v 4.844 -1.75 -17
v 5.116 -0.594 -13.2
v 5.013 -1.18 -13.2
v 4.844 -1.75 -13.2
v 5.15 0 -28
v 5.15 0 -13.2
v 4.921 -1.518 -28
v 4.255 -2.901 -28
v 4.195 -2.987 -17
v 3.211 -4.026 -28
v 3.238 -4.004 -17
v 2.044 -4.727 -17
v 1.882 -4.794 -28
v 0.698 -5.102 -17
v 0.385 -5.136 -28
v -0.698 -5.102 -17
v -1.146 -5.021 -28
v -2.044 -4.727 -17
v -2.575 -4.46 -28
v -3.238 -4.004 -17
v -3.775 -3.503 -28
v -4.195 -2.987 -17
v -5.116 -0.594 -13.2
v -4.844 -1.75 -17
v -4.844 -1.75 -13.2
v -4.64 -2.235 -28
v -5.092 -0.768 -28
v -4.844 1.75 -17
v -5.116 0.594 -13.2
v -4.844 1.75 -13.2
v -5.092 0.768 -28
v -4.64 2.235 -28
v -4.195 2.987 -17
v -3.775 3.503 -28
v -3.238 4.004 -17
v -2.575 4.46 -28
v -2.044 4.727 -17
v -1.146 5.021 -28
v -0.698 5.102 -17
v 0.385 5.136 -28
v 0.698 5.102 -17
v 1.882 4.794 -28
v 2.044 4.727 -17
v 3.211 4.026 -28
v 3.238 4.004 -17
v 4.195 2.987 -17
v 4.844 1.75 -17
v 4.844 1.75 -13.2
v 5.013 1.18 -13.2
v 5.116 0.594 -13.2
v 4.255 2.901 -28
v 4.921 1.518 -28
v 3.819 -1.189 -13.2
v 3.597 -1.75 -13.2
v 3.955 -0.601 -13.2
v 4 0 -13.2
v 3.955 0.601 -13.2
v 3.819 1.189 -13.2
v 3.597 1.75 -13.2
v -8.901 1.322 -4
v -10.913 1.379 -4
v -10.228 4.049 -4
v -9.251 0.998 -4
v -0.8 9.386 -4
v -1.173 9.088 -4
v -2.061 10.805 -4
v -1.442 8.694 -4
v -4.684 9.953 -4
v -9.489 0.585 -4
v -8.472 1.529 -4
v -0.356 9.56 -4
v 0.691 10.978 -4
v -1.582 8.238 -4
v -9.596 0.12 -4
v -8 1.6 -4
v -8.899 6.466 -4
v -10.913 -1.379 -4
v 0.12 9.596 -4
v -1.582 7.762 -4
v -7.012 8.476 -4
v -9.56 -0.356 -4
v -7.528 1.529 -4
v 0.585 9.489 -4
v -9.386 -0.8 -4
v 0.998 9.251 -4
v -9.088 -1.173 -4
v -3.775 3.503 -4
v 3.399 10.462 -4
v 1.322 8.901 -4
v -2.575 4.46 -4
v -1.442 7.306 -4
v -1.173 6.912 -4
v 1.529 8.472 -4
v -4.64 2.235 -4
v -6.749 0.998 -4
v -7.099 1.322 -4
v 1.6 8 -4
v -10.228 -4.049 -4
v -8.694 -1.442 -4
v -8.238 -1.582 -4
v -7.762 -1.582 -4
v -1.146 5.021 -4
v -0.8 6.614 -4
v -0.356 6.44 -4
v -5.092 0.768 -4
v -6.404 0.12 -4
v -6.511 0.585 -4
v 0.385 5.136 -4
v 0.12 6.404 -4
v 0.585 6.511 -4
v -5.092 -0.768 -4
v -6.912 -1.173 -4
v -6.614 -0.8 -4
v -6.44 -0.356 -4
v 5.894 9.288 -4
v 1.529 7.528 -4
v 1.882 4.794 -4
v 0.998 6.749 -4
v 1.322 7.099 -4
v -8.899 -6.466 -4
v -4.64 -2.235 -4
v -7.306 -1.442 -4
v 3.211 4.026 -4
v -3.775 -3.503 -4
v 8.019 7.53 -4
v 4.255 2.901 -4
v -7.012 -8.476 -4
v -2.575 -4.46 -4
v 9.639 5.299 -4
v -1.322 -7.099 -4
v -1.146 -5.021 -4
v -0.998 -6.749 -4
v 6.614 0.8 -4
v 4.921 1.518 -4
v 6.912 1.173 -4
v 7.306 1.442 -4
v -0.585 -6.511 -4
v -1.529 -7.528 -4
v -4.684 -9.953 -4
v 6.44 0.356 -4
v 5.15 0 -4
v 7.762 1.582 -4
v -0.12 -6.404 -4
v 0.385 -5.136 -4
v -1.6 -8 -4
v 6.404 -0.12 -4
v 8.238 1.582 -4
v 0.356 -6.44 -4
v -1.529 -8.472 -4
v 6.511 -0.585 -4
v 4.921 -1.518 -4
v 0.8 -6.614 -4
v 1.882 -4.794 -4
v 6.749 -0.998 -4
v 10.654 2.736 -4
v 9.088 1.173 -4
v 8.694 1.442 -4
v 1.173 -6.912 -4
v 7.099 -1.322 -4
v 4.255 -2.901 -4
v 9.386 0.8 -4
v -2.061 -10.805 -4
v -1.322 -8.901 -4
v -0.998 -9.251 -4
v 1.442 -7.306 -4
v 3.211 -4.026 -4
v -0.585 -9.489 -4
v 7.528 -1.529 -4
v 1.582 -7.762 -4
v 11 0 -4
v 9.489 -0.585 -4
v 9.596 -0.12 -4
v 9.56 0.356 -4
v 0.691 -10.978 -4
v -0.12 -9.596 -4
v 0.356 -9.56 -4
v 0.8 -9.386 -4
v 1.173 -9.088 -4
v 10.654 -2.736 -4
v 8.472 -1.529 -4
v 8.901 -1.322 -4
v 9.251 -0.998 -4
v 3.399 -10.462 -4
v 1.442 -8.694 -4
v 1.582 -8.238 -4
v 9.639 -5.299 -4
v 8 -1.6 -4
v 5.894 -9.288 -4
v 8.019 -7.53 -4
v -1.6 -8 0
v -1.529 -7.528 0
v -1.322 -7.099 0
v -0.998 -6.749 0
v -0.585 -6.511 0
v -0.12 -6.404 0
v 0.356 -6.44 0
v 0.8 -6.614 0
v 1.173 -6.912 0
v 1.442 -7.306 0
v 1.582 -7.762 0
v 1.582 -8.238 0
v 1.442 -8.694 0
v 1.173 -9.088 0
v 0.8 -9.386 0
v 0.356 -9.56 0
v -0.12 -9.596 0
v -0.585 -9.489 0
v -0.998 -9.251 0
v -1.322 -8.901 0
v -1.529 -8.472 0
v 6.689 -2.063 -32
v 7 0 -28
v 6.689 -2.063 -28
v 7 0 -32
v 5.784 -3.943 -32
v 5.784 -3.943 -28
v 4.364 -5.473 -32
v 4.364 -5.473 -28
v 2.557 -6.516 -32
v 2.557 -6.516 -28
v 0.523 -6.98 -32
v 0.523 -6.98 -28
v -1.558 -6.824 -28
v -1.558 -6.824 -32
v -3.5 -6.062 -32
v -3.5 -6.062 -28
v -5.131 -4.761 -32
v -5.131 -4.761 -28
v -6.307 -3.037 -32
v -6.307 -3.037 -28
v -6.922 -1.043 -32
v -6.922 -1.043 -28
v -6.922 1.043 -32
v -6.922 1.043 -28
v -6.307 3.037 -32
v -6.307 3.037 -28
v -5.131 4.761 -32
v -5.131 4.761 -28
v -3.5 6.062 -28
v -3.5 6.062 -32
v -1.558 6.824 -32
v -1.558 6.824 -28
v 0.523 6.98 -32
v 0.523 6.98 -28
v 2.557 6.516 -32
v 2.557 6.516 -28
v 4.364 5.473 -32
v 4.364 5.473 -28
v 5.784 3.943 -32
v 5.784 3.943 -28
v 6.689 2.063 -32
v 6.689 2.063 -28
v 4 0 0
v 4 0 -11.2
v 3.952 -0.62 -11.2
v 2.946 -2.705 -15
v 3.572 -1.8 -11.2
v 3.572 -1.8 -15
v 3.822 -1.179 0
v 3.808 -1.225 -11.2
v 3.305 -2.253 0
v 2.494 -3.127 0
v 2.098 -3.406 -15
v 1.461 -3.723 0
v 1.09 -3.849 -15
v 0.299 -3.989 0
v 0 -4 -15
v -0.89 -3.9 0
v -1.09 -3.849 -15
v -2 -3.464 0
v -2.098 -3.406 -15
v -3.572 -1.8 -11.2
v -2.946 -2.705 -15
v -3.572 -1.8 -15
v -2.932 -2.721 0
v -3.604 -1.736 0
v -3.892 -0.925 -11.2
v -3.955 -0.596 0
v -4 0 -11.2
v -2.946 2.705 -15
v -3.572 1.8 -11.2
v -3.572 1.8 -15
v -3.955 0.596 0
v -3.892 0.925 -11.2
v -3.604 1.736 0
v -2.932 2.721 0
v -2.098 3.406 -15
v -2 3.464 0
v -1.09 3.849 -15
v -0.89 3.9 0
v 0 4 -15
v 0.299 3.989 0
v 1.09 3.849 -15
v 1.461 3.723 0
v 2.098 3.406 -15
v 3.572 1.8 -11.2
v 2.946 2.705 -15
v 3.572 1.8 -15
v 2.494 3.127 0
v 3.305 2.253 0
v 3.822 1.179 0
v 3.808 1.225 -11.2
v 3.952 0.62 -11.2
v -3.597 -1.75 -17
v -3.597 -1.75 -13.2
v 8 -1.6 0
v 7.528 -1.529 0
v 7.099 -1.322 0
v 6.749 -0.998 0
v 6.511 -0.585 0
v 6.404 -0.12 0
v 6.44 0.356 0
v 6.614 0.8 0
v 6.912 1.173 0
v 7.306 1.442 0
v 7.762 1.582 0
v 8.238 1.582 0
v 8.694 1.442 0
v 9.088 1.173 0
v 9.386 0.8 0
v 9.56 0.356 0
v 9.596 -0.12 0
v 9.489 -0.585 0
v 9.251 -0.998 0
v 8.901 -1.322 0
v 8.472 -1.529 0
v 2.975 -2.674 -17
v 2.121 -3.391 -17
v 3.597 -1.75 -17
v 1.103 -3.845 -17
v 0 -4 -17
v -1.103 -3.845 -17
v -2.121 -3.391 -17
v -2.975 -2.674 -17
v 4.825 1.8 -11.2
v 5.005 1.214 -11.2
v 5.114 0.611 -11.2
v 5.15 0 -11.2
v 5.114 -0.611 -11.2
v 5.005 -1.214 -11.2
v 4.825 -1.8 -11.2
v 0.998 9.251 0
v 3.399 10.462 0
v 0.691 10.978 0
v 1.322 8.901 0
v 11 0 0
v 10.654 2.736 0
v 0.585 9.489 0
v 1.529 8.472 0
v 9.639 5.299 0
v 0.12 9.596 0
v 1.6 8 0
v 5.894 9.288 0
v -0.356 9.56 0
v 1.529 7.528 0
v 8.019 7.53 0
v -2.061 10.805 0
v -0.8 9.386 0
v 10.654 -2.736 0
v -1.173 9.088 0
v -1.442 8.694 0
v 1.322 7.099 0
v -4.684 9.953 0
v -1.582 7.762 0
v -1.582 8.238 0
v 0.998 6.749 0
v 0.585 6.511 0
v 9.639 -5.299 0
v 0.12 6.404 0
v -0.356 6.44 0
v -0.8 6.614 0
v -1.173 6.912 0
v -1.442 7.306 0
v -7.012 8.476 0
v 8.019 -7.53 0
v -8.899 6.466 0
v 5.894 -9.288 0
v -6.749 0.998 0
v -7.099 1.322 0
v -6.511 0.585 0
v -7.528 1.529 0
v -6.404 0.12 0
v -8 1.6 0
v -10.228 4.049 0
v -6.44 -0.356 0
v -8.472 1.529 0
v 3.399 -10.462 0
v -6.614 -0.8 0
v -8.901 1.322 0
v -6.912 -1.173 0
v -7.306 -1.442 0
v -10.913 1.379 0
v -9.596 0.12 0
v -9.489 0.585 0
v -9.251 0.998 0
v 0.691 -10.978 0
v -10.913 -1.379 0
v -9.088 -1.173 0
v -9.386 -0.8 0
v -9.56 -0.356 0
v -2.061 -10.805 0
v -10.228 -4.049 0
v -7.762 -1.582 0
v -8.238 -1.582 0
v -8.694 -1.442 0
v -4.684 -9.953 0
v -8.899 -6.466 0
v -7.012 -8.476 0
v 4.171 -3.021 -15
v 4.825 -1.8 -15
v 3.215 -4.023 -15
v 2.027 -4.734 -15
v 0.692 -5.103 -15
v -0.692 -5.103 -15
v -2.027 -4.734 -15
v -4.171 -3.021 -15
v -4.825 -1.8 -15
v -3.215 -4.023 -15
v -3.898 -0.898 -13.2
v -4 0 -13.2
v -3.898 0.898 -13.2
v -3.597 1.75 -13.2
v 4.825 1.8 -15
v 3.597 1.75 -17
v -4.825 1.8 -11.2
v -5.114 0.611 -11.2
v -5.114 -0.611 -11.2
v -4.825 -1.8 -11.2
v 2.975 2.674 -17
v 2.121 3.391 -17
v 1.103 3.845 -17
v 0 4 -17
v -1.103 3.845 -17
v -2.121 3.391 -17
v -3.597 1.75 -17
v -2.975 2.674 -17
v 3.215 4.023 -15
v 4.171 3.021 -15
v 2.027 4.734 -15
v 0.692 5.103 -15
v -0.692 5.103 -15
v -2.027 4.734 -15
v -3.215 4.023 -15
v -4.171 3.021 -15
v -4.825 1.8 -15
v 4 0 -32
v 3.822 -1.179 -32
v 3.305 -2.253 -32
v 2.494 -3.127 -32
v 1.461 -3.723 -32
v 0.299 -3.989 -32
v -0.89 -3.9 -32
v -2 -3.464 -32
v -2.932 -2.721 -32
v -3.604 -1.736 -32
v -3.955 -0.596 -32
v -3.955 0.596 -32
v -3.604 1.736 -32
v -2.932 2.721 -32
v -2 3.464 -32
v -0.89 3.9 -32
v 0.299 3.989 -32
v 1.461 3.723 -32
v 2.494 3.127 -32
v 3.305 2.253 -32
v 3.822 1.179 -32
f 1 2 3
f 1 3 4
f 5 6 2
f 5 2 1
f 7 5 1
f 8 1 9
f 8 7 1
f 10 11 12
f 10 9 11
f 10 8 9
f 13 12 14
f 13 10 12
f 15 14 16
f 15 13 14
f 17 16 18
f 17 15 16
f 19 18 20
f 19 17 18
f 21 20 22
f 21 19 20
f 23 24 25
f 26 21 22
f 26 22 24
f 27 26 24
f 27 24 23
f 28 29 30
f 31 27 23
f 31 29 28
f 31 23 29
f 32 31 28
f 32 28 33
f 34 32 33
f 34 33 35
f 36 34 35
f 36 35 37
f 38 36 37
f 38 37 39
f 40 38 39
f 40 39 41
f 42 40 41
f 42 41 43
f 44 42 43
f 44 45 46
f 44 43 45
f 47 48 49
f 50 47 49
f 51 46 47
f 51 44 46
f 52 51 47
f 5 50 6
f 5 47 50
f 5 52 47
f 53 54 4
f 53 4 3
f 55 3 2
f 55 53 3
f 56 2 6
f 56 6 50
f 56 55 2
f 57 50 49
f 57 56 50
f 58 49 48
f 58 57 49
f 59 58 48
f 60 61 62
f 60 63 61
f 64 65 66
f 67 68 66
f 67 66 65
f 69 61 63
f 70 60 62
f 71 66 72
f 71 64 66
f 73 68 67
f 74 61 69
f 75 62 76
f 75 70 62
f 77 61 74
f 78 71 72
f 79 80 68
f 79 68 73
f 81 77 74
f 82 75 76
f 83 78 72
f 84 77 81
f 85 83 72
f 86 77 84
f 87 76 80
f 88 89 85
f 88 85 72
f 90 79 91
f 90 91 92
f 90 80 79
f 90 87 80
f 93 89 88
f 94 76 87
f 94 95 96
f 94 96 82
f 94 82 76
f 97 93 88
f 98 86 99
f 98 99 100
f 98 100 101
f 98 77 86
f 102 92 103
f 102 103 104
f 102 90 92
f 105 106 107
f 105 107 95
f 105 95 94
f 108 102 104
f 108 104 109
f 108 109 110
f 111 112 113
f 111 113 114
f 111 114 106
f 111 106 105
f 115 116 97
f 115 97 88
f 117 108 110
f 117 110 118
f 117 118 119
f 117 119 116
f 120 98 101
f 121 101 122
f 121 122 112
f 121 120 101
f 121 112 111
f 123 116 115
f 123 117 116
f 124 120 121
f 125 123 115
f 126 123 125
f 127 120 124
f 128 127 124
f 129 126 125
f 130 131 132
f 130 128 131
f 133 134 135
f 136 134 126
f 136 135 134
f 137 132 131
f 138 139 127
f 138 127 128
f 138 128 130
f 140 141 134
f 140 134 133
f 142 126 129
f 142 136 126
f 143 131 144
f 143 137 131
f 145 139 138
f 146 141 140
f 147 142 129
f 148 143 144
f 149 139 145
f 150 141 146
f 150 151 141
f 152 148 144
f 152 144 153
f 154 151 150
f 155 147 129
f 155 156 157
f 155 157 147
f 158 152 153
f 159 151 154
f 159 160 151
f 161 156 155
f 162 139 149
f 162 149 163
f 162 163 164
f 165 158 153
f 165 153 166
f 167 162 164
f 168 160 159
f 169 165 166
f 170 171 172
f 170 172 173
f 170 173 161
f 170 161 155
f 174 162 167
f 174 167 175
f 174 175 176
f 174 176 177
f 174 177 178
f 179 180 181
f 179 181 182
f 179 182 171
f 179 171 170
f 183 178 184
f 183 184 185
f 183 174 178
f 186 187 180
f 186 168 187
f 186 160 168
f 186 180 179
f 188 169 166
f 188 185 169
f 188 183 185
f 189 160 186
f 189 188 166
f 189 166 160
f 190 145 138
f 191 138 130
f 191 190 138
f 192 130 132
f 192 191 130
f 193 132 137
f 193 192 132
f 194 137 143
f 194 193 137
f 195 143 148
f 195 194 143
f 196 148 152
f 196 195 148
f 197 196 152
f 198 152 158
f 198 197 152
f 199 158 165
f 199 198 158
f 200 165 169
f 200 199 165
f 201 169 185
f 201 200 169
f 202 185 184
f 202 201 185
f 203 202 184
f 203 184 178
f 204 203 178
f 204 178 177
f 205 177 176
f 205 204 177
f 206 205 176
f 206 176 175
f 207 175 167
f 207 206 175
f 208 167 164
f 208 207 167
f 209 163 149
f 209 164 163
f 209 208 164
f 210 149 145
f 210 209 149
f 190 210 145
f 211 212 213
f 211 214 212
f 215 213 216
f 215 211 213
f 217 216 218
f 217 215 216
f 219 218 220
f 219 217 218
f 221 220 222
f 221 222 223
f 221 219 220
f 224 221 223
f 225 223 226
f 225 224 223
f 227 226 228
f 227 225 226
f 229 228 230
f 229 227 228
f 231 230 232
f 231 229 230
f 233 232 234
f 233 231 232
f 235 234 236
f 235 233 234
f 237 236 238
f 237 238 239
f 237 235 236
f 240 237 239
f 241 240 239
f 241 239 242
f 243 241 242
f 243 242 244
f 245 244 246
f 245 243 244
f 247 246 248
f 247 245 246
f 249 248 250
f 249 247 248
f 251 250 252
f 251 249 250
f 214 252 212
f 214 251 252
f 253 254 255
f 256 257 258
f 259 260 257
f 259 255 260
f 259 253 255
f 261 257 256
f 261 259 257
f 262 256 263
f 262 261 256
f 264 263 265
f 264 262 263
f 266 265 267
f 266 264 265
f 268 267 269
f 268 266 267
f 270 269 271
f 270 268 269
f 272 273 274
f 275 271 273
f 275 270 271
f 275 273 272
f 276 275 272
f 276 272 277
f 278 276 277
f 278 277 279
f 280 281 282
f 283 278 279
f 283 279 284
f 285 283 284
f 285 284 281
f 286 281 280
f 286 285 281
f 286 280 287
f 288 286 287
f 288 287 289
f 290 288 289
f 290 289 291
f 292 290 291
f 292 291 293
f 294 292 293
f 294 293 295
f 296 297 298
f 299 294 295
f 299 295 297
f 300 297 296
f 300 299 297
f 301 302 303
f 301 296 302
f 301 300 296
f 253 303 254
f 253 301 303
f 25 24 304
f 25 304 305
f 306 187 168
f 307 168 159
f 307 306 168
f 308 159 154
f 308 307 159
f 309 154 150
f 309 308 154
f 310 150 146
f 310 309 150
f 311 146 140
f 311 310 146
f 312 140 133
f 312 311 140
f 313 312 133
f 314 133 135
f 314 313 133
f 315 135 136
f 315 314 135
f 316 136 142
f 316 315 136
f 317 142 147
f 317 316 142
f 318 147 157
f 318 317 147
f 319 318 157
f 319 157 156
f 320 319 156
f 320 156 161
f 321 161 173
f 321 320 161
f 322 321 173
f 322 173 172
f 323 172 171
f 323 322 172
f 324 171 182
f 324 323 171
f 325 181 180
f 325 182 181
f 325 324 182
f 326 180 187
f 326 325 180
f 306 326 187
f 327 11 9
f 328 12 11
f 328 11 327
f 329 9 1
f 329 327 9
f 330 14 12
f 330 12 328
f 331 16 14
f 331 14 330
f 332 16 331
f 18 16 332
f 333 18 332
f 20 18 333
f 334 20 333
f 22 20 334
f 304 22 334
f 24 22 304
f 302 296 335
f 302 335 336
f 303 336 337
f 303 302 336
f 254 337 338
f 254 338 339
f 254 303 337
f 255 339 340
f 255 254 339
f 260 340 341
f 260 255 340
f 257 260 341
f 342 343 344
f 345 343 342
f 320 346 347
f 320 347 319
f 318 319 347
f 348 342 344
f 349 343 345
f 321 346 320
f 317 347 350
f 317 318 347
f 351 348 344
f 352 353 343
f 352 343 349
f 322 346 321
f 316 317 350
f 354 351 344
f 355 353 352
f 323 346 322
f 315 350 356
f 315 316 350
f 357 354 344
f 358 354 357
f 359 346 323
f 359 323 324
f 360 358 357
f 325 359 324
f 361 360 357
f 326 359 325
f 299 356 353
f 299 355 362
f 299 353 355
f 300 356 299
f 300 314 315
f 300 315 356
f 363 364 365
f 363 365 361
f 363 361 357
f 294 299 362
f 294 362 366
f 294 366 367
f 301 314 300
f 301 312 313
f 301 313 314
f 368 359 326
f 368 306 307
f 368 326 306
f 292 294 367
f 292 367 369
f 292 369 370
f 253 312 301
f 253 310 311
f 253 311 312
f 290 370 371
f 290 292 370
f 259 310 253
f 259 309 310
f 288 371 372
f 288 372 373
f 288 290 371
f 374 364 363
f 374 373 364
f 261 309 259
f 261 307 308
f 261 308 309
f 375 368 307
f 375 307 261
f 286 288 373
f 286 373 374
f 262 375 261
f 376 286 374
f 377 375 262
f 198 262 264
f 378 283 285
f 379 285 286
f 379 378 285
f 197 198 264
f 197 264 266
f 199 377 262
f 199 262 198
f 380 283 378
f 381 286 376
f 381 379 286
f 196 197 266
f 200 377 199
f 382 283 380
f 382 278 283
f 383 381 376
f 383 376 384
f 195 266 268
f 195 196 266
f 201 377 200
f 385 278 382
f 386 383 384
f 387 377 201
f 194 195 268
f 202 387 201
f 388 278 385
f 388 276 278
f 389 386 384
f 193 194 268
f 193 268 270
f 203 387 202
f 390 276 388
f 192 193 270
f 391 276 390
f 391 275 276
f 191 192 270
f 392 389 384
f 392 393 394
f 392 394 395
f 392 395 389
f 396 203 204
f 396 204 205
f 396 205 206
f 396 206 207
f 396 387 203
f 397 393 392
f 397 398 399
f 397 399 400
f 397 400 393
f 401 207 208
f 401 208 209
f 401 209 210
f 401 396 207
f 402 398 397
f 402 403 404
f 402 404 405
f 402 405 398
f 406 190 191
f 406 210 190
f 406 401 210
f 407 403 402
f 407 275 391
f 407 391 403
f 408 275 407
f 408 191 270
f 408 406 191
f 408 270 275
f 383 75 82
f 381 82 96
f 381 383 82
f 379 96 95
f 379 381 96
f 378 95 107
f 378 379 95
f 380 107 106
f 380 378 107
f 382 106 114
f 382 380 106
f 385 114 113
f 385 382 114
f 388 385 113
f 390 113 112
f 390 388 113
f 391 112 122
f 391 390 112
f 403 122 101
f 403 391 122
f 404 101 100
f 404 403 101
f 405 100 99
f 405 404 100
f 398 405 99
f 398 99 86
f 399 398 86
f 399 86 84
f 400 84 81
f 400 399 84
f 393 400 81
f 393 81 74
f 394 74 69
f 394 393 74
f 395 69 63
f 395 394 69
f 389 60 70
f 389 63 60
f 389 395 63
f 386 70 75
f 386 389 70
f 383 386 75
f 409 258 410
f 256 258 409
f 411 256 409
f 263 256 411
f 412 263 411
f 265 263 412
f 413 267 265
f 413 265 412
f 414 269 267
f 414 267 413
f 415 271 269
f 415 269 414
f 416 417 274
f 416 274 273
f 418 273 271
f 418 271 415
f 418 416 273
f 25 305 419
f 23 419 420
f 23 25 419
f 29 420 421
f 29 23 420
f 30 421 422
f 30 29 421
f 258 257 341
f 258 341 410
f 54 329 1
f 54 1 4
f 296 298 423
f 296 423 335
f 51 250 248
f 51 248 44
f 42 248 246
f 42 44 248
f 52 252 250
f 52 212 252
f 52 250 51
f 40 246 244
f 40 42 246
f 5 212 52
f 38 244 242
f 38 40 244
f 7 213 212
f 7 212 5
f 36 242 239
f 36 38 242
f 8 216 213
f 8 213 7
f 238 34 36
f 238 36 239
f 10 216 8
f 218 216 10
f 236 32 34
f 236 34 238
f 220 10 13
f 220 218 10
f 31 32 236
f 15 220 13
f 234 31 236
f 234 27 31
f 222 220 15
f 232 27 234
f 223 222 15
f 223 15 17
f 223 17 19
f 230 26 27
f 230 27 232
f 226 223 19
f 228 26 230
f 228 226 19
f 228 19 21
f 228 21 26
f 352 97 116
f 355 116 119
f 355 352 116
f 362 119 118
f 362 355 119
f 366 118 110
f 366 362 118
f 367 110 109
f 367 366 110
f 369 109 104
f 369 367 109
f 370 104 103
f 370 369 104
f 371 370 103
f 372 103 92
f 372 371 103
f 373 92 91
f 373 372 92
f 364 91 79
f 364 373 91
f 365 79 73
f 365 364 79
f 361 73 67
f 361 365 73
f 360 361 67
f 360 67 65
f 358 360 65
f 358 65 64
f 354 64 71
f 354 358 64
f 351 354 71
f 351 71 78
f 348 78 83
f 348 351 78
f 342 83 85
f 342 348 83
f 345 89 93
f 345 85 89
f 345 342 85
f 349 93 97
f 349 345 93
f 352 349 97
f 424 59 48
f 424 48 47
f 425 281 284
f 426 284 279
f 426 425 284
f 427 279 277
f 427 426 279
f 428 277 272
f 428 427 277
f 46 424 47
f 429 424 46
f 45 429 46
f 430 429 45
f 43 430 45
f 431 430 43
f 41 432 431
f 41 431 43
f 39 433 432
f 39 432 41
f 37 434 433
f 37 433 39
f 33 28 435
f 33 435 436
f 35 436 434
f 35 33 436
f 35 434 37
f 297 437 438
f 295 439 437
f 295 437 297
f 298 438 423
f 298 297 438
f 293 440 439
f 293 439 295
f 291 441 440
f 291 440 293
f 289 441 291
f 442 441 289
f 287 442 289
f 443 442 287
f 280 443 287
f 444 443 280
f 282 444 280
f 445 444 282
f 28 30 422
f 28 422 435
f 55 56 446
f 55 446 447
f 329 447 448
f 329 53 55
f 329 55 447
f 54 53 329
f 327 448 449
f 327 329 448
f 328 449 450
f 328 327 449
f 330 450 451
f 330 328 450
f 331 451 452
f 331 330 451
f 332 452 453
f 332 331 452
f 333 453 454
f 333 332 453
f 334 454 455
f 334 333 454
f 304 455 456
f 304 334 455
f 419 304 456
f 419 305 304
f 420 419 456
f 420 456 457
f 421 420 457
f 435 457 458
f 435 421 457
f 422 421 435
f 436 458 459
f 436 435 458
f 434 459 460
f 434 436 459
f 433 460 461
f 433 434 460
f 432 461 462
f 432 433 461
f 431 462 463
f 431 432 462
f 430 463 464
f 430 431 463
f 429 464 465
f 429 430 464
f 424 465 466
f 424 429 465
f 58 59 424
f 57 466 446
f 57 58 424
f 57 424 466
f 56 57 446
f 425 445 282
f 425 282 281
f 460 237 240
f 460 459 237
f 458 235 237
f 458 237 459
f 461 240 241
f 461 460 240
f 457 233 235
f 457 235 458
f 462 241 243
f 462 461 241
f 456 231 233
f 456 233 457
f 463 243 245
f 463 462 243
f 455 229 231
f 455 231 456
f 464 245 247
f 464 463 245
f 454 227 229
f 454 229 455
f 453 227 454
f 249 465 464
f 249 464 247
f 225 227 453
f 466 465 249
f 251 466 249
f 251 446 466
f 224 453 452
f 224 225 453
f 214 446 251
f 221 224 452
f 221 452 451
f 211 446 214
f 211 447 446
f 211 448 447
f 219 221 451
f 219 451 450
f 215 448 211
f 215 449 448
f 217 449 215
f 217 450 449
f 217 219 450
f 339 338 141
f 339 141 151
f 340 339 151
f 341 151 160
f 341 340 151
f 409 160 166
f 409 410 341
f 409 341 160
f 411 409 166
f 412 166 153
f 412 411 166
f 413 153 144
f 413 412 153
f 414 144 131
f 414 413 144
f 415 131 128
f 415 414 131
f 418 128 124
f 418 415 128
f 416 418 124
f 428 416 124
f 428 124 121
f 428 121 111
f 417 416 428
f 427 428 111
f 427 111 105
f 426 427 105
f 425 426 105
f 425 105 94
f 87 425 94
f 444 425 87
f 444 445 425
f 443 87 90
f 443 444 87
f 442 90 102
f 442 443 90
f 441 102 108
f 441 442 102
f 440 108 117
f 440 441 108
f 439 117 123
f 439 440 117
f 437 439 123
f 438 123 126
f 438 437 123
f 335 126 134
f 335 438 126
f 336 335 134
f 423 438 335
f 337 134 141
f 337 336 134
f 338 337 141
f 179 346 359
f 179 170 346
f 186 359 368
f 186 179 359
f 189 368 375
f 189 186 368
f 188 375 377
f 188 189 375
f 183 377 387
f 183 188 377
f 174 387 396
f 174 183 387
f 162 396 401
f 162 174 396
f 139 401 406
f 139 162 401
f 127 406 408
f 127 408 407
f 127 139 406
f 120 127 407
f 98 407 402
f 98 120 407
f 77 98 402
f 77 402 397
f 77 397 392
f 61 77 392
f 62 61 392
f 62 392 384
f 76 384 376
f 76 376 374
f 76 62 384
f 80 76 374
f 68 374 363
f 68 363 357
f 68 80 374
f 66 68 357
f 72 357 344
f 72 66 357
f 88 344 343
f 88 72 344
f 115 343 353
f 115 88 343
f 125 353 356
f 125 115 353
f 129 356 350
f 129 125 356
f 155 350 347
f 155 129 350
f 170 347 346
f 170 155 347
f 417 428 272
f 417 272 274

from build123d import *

# Parameters (mm, degrees)
MATRIZC1_COUNT             = 4
CORTAR_EXTRUIR1_DEPTH      = 36.580893749
CORTAR_EXTRUIR1_DEPTH_BACK = 36.580893749


with BuildPart() as part:
    # Croquis1 → Revolución1 (revolve)
    with BuildSketch(Plane(origin=(0, 0, 0), x_dir=(0, 0, -1), z_dir=(1, 0, 0)), mode=Mode.PRIVATE) as revoluci_n1_sk:
        Polygon((0, 4), (0, 11), (4, 11), (4, 5.15), (28, 5.15), (28, 7), (32, 7), (32, 4), align=None)
    revolve(revoluci_n1_sk.sketch.rotate(Axis((0, 0, 0), (0, 0, -1)), 90), axis=Axis((0, 0, 0), (0, 0, -1)))

    # Croquis3 → Taladro de margen para M31 (revolve, cut)
    with BuildSketch(Plane(origin=(8, 0, 0), x_dir=(0, -1, 0), z_dir=(1, 0, 0))):
        Polygon((0, 0), (0, 8.6), (1.6, 7), (1.6, 0), align=None)
    taladro_de_margen_para_m31 = revolve(axis=Axis((8, 0, 6.35), (0, 0, -1)), mode=Mode.SUBTRACT)

    # MatrizC1: Taladro de margen para M31 ×4 about axis
    matrizc1_axis = Axis((0, 0, 0), (0, 0, 1))
    for i in range(1, MATRIZC1_COUNT):
        add(taladro_de_margen_para_m31.rotate(matrizc1_axis, i * 360 / MATRIZC1_COUNT), mode=Mode.SUBTRACT)

    # Croquis4 → Cortar-Extruir1 (cut, two sides: drawn at the far end of the back side and taken through both)
    with BuildSketch(Plane(origin=(0, 0, 0), x_dir=(0, 0, -1), z_dir=(1, 0, 0)).offset(-CORTAR_EXTRUIR1_DEPTH_BACK)):
        Polygon((11.2, -1.8), (15, -1.8), (15, -5.15), (17, -5.15), (17, -1.75), (13.2, -1.75), (13.2, 1.75), (17, 1.75), (17, 5.15), (15, 5.15), (15, 1.8), (11.2, 1.8), align=None)
    extrude(amount=CORTAR_EXTRUIR1_DEPTH + CORTAR_EXTRUIR1_DEPTH_BACK, mode=Mode.SUBTRACT)


with BuildPart() as cortar_extruir1_piece_1:
    # of the separate pieces the step leaves, piece 1, a body of its own (cortar_extruir1_pieces)
    add(part.part.solids().sort_by_distance((11, 0, 0))[0])


with BuildPart() as cortar_extruir1_piece_2:
    # of the separate pieces the step leaves, piece 2, a body of its own (cortar_extruir1_pieces)
    add(part.part.solids().sort_by_distance((4, 0, -32))[0])


solid = Compound([cortar_extruir1_piece_1.part, cortar_extruir1_piece_2.part])
